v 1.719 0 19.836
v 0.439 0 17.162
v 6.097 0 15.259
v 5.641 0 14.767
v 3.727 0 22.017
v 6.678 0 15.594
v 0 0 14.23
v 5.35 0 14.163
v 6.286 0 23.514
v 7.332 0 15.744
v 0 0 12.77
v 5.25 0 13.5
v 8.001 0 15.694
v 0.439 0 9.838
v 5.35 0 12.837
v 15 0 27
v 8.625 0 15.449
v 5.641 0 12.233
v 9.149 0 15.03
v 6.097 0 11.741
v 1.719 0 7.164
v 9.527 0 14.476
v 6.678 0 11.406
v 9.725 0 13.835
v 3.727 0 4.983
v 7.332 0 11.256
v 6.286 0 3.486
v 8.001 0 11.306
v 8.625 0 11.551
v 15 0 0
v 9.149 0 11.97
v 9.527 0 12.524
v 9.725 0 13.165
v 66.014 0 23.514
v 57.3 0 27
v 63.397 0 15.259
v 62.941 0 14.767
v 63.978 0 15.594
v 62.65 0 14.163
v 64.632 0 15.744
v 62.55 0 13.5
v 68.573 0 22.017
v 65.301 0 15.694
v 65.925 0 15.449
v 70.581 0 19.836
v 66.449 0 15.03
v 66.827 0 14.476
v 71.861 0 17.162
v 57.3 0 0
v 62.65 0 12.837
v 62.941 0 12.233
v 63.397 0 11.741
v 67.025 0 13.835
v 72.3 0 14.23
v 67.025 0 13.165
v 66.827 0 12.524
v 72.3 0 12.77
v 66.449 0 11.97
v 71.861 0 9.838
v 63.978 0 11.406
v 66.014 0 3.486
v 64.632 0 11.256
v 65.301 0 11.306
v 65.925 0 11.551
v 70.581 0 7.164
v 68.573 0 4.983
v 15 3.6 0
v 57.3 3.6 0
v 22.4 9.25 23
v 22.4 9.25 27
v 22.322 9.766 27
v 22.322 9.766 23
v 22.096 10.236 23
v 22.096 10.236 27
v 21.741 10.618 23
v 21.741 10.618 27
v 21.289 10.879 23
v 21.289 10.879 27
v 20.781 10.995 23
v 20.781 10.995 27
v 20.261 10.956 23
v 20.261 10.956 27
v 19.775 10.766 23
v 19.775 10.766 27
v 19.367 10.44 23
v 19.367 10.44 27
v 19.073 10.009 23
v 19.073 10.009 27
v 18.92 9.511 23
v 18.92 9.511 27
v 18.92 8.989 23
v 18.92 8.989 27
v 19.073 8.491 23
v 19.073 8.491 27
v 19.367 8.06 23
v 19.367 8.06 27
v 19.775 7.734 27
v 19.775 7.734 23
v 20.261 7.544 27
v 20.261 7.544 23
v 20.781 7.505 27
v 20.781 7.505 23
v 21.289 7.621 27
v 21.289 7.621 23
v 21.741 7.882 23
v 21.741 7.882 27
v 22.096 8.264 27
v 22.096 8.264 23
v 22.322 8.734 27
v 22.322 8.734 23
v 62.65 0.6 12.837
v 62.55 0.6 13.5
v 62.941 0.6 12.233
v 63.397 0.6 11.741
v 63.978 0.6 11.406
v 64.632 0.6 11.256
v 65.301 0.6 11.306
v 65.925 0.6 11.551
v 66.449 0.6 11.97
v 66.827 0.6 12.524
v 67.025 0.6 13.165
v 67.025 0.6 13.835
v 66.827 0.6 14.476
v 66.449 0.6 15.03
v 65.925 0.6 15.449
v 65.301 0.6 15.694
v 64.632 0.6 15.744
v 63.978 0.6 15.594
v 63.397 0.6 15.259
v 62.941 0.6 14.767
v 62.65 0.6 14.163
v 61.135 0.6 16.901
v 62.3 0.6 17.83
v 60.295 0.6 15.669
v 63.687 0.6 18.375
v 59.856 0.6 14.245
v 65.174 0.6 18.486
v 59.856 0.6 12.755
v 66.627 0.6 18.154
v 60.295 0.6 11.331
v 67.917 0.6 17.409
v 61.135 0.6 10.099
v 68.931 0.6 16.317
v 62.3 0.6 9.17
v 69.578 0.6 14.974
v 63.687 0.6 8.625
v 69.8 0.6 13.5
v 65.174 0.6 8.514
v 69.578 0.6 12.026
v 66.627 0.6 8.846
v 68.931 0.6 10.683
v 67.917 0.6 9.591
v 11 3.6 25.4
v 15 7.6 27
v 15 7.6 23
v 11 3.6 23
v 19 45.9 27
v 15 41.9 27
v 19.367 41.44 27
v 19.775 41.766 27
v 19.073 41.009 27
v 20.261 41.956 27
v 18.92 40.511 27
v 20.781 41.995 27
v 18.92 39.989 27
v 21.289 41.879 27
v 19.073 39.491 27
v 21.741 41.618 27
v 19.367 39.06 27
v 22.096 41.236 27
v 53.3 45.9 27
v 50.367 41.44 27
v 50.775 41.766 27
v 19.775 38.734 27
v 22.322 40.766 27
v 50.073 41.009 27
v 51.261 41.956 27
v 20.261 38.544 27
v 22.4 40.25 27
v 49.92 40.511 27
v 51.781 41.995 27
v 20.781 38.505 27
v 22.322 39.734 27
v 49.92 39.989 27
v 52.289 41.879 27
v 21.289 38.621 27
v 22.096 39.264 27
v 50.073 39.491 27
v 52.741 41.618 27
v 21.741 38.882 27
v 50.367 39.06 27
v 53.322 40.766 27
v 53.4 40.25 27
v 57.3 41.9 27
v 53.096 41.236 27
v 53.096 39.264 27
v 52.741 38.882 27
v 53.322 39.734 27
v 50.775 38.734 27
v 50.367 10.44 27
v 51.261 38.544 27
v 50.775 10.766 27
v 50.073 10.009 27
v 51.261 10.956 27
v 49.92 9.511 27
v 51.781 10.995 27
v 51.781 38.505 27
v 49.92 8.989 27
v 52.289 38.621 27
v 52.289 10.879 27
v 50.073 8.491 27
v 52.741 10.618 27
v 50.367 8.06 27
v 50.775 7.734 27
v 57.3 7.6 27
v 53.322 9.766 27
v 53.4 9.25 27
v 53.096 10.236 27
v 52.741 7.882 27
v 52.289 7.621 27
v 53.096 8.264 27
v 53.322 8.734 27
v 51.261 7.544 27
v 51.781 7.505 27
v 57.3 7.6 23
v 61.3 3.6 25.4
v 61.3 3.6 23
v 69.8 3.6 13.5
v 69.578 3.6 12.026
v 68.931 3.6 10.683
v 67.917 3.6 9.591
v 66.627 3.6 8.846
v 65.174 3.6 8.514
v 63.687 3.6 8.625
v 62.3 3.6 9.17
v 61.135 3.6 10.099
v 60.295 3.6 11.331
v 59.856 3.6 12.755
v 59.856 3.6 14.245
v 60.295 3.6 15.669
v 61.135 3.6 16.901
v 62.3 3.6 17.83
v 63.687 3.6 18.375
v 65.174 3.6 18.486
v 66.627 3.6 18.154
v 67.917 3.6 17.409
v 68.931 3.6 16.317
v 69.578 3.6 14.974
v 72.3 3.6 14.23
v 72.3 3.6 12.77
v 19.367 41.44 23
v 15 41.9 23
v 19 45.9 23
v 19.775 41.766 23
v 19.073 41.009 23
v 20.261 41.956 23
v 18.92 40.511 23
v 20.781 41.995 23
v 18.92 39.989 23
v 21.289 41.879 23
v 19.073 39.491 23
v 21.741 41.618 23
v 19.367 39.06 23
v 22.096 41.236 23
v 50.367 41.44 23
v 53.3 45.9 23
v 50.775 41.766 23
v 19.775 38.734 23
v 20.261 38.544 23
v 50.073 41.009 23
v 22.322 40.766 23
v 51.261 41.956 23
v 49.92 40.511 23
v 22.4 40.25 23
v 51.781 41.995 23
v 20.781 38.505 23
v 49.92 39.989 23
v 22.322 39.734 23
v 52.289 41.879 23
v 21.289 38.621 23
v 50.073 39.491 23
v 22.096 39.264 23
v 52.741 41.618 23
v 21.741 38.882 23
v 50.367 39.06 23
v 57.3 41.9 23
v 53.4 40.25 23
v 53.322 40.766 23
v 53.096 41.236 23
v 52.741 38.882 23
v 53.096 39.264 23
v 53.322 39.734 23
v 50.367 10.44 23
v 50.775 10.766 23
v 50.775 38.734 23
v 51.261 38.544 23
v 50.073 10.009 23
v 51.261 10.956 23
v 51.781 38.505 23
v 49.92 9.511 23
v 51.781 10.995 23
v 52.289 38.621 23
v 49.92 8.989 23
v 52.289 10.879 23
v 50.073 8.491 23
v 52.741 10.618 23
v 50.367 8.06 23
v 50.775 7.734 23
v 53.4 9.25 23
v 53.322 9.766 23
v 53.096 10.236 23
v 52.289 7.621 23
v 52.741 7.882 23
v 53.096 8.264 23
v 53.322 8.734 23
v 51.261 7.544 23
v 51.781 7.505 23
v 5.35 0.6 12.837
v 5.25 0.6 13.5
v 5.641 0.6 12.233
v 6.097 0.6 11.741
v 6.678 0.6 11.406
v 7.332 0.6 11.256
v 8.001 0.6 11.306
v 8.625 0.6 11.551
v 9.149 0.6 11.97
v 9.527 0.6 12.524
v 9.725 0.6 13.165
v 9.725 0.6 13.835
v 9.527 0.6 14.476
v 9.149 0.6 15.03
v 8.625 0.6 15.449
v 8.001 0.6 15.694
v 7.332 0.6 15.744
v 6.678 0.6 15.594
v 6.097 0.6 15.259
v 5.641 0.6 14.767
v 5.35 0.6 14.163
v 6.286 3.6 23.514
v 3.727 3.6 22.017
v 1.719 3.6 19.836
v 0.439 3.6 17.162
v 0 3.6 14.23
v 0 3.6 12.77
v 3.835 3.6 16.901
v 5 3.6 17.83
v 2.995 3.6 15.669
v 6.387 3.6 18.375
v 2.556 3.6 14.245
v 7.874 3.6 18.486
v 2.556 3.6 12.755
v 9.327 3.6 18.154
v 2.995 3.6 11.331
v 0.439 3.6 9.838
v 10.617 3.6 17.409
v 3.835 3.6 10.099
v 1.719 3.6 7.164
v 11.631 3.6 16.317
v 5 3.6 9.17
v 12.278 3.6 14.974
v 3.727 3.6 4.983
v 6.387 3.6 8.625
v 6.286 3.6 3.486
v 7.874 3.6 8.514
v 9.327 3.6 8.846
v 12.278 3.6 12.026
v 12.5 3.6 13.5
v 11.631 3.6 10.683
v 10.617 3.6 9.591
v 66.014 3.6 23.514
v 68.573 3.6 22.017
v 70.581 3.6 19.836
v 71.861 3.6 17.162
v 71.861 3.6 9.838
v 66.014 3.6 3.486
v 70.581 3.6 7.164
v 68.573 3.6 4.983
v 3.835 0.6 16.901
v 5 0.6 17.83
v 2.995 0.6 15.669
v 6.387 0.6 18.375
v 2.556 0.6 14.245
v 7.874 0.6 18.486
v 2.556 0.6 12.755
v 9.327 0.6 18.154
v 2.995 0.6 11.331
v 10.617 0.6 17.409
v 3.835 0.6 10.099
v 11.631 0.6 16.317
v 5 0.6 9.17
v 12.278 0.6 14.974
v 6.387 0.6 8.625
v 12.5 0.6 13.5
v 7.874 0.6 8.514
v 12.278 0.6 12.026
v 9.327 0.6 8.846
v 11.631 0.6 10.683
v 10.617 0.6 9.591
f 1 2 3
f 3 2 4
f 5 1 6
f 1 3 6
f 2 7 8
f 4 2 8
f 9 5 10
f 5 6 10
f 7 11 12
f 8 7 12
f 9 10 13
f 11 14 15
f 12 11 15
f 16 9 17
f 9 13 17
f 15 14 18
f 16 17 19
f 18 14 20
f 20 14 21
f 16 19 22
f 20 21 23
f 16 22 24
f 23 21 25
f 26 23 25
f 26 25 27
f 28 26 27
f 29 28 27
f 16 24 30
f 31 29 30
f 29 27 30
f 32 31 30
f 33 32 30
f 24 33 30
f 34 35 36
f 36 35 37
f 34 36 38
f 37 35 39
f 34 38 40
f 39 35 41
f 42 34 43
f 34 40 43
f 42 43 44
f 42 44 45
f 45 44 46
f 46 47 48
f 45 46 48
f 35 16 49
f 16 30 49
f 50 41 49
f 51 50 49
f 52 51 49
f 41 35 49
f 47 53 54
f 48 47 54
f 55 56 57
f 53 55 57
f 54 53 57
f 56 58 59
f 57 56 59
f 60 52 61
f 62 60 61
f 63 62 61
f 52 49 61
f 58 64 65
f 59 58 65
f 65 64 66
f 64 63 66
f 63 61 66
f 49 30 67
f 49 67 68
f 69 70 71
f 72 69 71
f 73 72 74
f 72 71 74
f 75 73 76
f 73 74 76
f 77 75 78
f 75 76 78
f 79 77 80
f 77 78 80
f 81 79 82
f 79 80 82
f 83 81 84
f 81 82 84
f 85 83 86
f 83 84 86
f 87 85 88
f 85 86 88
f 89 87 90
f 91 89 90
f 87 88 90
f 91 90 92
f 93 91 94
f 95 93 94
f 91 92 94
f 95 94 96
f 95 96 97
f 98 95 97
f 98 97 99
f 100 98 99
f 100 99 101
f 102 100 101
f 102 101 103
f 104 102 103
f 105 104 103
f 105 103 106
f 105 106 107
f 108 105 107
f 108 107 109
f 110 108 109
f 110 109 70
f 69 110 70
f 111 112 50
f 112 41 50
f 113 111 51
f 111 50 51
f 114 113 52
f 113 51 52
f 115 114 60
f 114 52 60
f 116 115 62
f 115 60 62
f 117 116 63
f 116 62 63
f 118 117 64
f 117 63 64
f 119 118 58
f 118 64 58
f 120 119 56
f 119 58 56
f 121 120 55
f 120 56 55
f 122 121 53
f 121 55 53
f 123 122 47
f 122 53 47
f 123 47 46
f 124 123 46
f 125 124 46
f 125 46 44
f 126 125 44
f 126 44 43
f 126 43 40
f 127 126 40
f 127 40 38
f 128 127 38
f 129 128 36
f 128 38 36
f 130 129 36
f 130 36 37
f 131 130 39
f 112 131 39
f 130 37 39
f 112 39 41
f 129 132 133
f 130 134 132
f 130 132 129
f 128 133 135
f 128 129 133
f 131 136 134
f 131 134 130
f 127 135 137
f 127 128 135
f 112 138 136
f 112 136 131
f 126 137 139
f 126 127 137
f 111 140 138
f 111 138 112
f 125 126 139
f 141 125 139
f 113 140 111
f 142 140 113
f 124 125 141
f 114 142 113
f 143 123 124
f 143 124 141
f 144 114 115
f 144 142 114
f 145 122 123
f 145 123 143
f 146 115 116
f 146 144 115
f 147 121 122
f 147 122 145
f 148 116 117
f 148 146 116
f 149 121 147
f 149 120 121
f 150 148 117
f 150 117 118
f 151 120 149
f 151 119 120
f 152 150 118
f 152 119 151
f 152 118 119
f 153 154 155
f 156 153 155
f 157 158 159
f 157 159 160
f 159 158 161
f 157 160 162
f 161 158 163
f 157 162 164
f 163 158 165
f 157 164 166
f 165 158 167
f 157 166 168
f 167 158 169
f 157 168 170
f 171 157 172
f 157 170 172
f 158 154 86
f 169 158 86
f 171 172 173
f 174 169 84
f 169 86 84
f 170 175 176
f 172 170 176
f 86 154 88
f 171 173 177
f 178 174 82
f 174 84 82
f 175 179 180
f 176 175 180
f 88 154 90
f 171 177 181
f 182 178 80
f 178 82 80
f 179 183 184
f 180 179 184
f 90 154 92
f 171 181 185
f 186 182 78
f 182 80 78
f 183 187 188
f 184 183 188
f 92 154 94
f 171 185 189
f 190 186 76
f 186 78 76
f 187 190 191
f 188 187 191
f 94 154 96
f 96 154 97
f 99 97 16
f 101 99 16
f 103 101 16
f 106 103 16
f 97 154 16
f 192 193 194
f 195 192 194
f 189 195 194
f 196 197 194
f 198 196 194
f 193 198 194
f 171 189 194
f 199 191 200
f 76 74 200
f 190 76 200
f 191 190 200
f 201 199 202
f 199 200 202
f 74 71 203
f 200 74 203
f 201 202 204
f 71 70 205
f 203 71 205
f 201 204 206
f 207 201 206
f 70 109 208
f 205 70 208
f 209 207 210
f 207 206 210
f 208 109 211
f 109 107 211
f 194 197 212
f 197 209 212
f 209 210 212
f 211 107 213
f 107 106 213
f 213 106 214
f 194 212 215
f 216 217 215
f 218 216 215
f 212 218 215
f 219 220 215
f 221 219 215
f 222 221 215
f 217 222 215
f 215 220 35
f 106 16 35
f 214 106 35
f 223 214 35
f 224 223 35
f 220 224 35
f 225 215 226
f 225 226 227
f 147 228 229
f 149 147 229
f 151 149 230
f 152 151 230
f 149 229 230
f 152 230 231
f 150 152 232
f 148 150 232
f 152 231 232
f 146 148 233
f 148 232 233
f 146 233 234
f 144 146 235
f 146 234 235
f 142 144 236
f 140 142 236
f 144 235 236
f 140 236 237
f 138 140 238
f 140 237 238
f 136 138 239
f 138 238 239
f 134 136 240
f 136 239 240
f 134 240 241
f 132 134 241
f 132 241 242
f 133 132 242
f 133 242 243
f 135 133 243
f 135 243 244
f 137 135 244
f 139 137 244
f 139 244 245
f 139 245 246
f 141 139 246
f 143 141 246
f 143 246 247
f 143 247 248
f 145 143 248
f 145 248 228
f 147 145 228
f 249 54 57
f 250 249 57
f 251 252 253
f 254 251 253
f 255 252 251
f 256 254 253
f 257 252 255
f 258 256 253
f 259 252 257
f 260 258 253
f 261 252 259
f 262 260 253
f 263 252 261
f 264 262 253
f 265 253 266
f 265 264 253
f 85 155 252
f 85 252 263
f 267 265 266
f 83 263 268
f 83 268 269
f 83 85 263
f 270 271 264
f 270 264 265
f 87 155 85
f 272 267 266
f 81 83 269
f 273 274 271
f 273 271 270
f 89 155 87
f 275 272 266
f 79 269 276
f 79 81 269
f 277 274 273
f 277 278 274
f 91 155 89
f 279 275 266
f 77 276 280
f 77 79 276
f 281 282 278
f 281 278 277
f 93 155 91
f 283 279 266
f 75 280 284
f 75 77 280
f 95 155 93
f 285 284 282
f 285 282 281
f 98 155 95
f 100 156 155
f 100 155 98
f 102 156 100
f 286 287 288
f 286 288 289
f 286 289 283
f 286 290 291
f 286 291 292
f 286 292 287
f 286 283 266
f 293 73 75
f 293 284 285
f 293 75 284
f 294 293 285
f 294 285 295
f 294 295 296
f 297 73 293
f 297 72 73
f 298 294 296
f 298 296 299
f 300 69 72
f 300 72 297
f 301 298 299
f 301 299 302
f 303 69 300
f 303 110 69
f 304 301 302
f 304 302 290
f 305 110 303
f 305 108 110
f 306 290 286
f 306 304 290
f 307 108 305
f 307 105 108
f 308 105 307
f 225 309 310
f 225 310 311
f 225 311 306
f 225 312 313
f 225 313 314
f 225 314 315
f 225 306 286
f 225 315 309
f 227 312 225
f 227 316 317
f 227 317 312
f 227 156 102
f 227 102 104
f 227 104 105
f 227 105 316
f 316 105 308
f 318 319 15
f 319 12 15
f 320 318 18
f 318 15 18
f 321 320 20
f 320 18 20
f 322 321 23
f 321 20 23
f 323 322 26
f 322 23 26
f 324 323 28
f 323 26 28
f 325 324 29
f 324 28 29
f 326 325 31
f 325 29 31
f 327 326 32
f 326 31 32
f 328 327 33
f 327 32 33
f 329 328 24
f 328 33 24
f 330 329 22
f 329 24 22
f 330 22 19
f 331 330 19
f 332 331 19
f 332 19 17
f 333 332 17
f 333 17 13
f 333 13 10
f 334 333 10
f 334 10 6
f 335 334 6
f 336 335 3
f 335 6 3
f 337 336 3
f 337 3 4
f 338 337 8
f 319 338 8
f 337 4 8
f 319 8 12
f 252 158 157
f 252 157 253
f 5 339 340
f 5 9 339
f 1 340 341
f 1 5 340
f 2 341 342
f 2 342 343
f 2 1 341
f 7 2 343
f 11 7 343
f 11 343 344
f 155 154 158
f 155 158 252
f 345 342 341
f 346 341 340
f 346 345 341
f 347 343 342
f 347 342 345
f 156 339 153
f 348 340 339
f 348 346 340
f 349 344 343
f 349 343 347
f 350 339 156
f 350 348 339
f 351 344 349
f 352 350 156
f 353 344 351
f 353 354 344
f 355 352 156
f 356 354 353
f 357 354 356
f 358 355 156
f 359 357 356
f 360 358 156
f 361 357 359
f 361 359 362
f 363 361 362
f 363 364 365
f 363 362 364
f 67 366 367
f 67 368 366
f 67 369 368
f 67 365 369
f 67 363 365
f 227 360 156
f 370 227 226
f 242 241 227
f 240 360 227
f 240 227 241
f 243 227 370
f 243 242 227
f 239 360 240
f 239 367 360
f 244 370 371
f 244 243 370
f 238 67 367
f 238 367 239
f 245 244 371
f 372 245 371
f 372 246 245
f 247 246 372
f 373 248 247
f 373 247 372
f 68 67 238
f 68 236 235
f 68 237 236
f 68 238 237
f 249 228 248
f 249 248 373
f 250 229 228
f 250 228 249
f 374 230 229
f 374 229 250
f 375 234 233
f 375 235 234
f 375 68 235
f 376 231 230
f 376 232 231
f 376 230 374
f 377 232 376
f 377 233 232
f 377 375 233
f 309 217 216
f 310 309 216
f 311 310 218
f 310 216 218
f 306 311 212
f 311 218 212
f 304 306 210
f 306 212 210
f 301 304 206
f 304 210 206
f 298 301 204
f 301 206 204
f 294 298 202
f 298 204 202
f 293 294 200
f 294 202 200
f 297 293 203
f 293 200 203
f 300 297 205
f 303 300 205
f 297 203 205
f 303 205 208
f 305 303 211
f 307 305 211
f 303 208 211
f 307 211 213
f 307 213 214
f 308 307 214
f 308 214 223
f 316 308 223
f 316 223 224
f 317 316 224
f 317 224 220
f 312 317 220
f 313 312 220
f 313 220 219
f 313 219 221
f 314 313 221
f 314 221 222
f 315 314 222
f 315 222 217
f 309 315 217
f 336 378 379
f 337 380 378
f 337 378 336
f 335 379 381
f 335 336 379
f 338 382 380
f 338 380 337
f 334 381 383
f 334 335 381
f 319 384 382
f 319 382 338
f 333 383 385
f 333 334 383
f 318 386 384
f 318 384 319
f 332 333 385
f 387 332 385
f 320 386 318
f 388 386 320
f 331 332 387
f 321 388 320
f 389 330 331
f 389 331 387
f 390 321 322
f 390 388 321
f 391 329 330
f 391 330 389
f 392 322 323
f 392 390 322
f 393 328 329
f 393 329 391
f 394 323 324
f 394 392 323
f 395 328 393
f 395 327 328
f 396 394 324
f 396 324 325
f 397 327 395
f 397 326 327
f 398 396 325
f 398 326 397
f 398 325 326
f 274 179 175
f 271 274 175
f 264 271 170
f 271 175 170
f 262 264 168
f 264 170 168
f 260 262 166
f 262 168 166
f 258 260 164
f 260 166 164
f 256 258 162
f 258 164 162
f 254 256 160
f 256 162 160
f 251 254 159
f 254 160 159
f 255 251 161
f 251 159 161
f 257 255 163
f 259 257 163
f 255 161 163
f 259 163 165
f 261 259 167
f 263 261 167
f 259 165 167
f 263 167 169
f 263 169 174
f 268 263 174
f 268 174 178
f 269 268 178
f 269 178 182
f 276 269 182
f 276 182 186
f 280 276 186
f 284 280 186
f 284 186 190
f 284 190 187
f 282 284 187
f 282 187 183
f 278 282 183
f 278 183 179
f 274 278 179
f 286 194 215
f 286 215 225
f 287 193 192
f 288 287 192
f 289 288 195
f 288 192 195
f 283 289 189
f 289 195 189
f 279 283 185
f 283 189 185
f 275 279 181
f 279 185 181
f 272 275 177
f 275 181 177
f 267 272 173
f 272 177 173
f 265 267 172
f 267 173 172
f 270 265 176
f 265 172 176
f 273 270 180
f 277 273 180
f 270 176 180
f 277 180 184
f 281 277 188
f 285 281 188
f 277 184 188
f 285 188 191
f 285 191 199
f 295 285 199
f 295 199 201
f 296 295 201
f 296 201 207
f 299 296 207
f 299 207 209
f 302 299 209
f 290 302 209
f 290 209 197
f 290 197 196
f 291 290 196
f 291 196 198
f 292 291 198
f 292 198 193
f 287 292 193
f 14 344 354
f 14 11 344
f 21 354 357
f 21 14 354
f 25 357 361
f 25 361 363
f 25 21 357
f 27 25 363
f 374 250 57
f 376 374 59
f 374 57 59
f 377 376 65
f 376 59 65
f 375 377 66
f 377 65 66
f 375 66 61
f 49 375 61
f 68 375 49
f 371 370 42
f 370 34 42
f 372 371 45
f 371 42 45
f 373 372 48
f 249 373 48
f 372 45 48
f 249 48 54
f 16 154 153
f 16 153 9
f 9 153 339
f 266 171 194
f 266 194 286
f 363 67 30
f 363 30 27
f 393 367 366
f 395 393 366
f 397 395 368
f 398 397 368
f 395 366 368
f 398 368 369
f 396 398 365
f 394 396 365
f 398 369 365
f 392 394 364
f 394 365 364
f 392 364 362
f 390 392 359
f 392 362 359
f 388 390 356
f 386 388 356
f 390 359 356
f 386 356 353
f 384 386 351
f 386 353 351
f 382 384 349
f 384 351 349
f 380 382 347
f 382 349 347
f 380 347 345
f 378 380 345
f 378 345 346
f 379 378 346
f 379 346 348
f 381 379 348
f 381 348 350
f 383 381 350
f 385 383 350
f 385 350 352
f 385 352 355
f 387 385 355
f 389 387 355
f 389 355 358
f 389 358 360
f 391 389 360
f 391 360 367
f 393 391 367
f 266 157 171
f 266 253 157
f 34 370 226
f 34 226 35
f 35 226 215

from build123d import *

# Parameters (mm, degrees)
SCHIZZO2_W                                           = 72.3
SCHIZZO2_H                                           = 27
ESTRUSIONE_ESTRUSIONE1_DEPTH                         = 3.6
SCHIZZO3_W                                           = 42.3
SCHIZZO3_H                                           = 4
ESTRUSIONE_ESTRUSIONE2_DEPTH                         = 42.3
SCHIZZO4_R                                           = 1.75
TAGLIO_ESTRUSIONE1_DEPTH                             = 42.3
FORO_LAMATO_PER_VITE_M4_A_TESTA_CILINDRI_D           = 4.5
FORO_LAMATO_PER_VITE_M4_A_TESTA_CILINDRI_DEPTH       = 9
FORO_LAMATO_PER_VITE_M4_A_TESTA_CILINDRI_CBORE_D     = 10
FORO_LAMATO_PER_VITE_M4_A_TESTA_CILINDRI_CBORE_DEPTH = 3
FORO_LAMATO_PER_VITE_M4_A_TESTA_CILINDRI_TIP         = 1.351936393
TAGLIO_ESTRUSIONE2_DEPTH                             = 42.3
SMUSSO1_SIZE                                         = 4
RACCORDO1_R                                          = 10
SMUSSO2_SIZE                                         = 4


with BuildPart() as part:
    # Schizzo2 → Estrusione-Estrusione1 (new body)
    with BuildSketch(Plane(origin=(0, 0, 0), x_dir=(1, 0, 0), z_dir=(0, 1, 0))):
        with Locations((36.15, -13.5)):
            Rectangle(SCHIZZO2_W, SCHIZZO2_H)
    extrude(amount=ESTRUSIONE_ESTRUSIONE1_DEPTH)

    # Schizzo3 → Estrusione-Estrusione2 (add)
    with BuildSketch(Plane(origin=(0, 3.6, 0), x_dir=(1, 0, 0), z_dir=(0, 1, 0))):
        with Locations((36.15, -25)):
            Rectangle(SCHIZZO3_W, SCHIZZO3_H)
    extrude(amount=ESTRUSIONE_ESTRUSIONE2_DEPTH)

    # Schizzo4 → Taglio-Estrusione1 (cut)
    with BuildSketch(Plane.XY.offset(27)):
        with Locations((20.65, 40.25)):
            Circle(SCHIZZO4_R)
        with Locations((51.65, 40.25)):
            Circle(SCHIZZO4_R)
        with Locations((51.65, 9.25)):
            Circle(SCHIZZO4_R)
        with Locations((20.65, 9.25)):
            Circle(SCHIZZO4_R)
    extrude(amount=-TAGLIO_ESTRUSIONE1_DEPTH, mode=Mode.SUBTRACT)

    # Foro lamato per Vite M4 a testa cilindrica-2
    with Locations(Plane(origin=(0, 3.6, 0), x_dir=(1, 0, 0), z_dir=(0, 1, 0))):
        with Locations((7.5, -13.5), (64.8, -13.5)):
            CounterBoreHole(FORO_LAMATO_PER_VITE_M4_A_TESTA_CILINDRI_D / 2, FORO_LAMATO_PER_VITE_M4_A_TESTA_CILINDRI_CBORE_D / 2, FORO_LAMATO_PER_VITE_M4_A_TESTA_CILINDRI_CBORE_DEPTH, depth=FORO_LAMATO_PER_VITE_M4_A_TESTA_CILINDRI_DEPTH)
            with Locations((0, 0, -(FORO_LAMATO_PER_VITE_M4_A_TESTA_CILINDRI_DEPTH + FORO_LAMATO_PER_VITE_M4_A_TESTA_CILINDRI_TIP / 2))):  # 118° drill point
                Cone(0, FORO_LAMATO_PER_VITE_M4_A_TESTA_CILINDRI_D / 2, FORO_LAMATO_PER_VITE_M4_A_TESTA_CILINDRI_TIP, mode=Mode.SUBTRACT)

    # Schizzo8 → Taglio-Estrusione2 (cut)
    with BuildSketch(Plane(origin=(0, 3.6, 0), x_dir=(1, 0, 0), z_dir=(0, 1, 0))):
        Polygon((15, -27), (0, -21), (0, -27), align=None)
        Polygon((0, -6), (0, 0), (15, 0), align=None)
        Polygon((57.3, 0), (72.3, 0), (72.3, -6), align=None)
        Polygon((57.3, -27), (72.3, -27), (72.3, -21), align=None)
    extrude(amount=-TAGLIO_ESTRUSIONE2_DEPTH, mode=Mode.SUBTRACT)

    # Smusso1
    smusso1_edges = [part.edges().sort_by_distance(p)[0] for p in [
        (15, 45.9, 25),
        (57.3, 45.9, 25),
    ]]
    chamfer(smusso1_edges, length=SMUSSO1_SIZE)

    # Raccordo1
    raccordo1_edges = [part.edges().sort_by_distance(p)[0] for p in [
        (0, 1.8, 21),
        (72.3, 1.8, 21),
        (72.3, 1.8, 6),
        (0, 1.8, 6),
    ]]
    fillet(raccordo1_edges, radius=RACCORDO1_R)

    # Smusso2
    smusso2_edges = [part.edges().sort_by_distance(p)[0] for p in [
        (15, 3.6, 25),
        (57.3, 3.6, 25),
    ]]
    chamfer(smusso2_edges, length=SMUSSO2_SIZE)


solid = part.part
